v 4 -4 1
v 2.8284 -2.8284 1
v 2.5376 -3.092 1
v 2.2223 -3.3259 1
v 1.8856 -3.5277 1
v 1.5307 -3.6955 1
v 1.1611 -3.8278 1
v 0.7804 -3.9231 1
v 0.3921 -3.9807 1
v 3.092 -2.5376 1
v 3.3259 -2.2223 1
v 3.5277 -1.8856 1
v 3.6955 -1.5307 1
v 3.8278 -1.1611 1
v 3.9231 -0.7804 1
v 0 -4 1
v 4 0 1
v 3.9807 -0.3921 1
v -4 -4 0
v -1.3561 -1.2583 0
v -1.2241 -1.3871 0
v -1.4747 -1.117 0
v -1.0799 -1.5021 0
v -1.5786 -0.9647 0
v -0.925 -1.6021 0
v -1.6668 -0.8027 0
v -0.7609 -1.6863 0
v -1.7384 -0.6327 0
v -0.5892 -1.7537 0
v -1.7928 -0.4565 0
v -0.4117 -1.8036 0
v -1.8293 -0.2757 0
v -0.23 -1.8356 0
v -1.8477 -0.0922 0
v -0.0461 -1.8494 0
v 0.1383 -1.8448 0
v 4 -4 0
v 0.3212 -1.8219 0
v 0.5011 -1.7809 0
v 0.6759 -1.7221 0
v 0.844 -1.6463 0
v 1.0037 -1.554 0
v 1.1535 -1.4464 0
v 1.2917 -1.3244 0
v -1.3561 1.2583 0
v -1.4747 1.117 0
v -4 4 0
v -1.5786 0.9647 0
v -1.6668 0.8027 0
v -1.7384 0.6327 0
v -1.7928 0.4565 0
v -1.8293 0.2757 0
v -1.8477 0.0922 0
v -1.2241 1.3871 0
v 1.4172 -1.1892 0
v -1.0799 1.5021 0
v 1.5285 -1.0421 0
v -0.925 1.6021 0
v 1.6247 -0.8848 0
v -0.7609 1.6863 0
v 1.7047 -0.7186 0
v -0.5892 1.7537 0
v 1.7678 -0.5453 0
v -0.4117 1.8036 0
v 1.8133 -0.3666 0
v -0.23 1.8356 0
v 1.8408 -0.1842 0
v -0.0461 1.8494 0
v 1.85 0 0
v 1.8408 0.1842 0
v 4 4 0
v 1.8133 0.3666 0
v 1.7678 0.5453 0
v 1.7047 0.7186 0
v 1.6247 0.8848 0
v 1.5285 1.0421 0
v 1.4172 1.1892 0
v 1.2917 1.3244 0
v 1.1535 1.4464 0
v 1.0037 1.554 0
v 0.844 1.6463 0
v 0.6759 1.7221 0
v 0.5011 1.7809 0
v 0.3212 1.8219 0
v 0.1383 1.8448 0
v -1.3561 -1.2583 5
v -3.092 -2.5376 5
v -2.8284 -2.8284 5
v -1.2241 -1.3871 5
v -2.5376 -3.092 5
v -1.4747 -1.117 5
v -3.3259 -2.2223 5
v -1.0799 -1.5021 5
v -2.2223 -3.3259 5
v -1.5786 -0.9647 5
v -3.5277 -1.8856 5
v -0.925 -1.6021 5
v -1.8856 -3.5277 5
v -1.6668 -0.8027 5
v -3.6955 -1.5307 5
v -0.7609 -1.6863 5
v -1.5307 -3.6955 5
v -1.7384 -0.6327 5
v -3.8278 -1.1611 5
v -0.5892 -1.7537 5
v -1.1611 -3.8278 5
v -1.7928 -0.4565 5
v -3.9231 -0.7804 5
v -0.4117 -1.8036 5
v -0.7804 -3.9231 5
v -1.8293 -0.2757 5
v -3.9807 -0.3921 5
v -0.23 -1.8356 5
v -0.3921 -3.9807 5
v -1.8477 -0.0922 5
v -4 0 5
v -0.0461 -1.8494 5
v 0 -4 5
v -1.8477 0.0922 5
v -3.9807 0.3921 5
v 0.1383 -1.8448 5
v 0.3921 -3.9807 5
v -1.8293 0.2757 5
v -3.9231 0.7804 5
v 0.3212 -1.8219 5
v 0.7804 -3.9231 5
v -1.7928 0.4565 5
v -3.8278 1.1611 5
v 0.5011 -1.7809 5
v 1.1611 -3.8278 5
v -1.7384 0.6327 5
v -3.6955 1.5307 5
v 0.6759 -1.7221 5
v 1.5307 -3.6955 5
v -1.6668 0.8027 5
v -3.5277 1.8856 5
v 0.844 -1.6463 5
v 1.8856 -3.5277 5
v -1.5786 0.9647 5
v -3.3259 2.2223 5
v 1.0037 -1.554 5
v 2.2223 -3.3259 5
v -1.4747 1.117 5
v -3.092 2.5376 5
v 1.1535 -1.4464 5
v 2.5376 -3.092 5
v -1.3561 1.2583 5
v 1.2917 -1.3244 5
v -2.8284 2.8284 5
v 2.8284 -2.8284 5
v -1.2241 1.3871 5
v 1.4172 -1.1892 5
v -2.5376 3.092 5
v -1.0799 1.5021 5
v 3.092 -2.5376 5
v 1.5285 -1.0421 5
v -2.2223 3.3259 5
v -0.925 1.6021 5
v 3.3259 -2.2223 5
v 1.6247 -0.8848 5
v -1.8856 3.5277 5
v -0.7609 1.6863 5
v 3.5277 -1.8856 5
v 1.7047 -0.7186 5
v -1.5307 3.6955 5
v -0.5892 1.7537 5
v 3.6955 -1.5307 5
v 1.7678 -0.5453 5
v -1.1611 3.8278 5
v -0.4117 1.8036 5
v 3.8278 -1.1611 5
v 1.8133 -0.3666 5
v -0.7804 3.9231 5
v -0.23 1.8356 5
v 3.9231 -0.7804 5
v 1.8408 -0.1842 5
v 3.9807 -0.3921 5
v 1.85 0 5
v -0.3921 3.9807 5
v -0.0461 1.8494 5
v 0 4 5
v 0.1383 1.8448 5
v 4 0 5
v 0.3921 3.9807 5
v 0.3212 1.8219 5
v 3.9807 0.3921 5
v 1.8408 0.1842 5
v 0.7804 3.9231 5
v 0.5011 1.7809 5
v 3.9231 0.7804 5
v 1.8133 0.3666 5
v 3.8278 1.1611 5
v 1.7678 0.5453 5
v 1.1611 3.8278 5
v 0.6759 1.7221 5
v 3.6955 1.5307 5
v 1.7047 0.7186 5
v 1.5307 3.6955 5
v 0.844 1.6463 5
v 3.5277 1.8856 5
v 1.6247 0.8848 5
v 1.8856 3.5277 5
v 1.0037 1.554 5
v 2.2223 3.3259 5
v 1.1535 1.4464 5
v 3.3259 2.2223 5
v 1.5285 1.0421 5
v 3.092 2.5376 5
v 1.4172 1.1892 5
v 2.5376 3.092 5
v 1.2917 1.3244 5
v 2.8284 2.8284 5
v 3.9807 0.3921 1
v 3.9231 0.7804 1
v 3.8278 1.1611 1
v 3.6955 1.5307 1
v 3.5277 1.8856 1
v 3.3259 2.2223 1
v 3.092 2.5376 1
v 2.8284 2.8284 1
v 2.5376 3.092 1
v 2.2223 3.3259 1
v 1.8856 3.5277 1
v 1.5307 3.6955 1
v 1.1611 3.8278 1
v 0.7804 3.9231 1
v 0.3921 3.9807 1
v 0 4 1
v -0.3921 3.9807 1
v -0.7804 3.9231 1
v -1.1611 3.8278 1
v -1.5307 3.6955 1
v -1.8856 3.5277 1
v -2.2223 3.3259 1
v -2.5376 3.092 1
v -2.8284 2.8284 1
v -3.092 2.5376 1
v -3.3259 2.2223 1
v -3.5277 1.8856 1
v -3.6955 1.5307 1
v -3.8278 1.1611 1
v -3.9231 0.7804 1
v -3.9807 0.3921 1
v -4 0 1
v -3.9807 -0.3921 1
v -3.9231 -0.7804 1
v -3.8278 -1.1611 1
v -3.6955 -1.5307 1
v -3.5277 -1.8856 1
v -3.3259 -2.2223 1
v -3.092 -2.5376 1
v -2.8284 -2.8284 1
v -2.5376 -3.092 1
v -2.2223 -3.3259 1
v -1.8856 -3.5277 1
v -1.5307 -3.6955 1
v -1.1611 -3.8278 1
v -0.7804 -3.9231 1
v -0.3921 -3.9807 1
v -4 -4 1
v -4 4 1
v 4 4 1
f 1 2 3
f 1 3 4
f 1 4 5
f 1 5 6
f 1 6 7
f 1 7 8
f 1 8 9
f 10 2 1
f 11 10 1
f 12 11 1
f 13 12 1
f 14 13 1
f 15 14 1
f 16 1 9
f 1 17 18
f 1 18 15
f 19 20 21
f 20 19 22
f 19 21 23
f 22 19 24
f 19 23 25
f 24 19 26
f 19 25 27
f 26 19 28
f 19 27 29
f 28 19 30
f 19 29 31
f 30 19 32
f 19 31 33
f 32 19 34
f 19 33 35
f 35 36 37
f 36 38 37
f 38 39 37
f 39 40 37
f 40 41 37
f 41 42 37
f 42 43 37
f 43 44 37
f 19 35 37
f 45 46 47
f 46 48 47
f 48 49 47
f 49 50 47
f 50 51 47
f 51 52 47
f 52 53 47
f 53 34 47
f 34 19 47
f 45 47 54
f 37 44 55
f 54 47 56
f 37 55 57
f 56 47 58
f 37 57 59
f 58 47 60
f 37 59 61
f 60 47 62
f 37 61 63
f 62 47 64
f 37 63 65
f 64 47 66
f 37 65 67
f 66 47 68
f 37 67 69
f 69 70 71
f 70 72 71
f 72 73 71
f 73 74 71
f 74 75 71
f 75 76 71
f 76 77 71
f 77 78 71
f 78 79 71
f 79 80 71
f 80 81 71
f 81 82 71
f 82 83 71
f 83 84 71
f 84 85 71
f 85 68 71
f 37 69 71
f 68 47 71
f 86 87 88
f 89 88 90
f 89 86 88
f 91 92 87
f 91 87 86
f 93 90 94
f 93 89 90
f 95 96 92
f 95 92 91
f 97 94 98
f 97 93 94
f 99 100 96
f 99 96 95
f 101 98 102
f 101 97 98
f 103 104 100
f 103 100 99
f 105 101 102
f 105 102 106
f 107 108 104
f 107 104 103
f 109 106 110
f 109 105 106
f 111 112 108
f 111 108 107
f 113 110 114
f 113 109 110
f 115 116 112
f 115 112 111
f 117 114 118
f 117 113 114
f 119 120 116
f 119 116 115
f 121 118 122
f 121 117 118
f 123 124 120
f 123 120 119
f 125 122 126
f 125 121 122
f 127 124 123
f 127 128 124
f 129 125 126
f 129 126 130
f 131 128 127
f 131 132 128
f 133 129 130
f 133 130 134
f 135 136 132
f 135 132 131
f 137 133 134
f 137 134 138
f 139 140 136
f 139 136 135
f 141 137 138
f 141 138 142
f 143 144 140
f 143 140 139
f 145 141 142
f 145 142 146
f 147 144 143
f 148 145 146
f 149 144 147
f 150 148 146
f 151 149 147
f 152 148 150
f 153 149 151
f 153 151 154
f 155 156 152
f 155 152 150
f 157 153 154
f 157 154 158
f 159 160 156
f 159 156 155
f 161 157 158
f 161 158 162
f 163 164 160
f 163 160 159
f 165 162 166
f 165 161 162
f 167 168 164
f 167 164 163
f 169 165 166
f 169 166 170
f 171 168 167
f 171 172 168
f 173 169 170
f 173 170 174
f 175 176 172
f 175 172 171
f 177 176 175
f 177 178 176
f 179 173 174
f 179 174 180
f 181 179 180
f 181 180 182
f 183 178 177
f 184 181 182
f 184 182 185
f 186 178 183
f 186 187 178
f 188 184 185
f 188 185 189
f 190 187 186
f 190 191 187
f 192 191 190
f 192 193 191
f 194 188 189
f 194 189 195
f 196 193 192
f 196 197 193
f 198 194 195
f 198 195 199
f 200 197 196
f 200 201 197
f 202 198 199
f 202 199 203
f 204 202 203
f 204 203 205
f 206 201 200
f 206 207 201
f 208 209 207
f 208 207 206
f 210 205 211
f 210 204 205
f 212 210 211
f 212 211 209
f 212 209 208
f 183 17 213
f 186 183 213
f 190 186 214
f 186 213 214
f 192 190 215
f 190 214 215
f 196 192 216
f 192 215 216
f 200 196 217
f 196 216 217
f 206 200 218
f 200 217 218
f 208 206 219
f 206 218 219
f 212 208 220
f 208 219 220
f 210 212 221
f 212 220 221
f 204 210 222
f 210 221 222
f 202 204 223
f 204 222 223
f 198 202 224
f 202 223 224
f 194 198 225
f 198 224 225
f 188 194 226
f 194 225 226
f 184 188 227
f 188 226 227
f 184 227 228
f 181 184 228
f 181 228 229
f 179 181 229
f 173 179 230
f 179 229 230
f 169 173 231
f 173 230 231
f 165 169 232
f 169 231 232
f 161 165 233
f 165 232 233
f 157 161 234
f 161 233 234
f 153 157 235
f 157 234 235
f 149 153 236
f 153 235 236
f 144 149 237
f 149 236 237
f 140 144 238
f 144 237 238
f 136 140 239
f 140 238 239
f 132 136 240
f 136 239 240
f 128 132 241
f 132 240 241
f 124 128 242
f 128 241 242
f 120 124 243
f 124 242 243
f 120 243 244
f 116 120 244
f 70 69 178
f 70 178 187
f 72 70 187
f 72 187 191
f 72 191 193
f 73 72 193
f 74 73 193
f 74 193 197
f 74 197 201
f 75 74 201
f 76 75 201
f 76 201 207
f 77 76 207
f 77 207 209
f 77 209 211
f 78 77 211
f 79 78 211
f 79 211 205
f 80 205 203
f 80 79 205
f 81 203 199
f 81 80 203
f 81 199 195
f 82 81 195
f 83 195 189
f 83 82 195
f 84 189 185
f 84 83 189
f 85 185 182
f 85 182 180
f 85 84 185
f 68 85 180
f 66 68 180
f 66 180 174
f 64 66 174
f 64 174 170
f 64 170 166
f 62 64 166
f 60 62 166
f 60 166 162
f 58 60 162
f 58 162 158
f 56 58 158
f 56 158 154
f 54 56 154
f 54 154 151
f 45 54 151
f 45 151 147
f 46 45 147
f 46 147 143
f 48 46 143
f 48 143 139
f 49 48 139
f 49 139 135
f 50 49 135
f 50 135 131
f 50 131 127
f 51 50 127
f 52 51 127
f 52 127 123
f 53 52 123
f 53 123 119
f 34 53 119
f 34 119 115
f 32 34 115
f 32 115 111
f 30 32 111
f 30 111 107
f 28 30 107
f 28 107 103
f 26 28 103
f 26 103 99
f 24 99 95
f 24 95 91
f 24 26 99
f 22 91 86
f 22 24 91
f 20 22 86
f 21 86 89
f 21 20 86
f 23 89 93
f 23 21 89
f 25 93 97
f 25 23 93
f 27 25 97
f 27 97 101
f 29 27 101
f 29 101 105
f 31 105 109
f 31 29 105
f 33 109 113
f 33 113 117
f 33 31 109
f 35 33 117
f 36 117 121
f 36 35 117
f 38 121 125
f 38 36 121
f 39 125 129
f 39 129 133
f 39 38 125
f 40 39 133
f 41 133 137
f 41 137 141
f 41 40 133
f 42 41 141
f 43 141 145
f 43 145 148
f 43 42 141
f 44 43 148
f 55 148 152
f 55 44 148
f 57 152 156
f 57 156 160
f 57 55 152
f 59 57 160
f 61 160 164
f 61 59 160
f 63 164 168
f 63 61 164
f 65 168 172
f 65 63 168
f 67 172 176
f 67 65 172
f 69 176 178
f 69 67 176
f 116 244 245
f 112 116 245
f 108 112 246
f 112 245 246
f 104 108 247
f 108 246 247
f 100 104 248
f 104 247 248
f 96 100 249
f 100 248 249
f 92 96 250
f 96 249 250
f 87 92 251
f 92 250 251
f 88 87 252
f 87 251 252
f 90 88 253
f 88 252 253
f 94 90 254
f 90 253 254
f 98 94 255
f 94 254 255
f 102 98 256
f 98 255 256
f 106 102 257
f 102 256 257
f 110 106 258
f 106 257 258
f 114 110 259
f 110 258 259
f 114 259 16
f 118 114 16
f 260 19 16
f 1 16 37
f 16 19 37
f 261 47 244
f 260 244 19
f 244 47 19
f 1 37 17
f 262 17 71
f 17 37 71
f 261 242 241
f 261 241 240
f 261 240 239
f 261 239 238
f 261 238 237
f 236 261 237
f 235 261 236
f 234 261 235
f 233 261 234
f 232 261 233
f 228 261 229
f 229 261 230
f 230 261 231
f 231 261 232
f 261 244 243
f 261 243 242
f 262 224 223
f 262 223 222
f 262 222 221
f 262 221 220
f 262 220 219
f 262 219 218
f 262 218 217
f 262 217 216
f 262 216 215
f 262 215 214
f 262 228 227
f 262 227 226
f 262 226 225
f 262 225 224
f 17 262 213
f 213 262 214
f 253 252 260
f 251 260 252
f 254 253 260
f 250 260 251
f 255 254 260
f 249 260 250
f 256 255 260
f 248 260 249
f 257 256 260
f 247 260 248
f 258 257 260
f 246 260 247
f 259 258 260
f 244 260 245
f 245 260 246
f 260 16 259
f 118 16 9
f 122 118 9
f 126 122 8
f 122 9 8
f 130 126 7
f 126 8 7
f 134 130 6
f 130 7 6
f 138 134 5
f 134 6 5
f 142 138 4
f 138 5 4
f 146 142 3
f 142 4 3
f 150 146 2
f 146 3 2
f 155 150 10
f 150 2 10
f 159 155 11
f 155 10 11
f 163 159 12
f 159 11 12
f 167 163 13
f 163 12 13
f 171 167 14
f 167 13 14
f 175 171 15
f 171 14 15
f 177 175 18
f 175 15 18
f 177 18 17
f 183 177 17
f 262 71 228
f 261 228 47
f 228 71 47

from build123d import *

# Parameters (mm, degrees)
F0_R     = 1.85
F1_DEPTH = 1
F2_DEPTH = 5


with BuildPart() as f1:
    # F0 (on Top) → F1 (new body)
    with BuildSketch(Plane.XY):
        with BuildLine():
            ThreePointArc((4, 0), (2.8284271247, 2.8284271247), (0, 4))
            ThreePointArc((0, 4), (-2.8284271247, 2.8284271247), (-4, 0))
            ThreePointArc((-4, 0), (-2.8284271247, -2.8284271247), (0, -4))
            ThreePointArc((0, -4), (2.8284271247, -2.8284271247), (4, 0))
        make_face()
        Circle(F0_R, mode=Mode.SUBTRACT)
        with BuildLine():
            Line((0, 4), (-4, 4))
            Line((-4, 4), (-4, 0))
            ThreePointArc((-4, 0), (-2.8284271247, 2.8284271247), (0, 4))
        make_face()
        with BuildLine():
            Line((4, 4), (0, 4))
            ThreePointArc((0, 4), (2.8284271247, 2.8284271247), (4, 0))
            Line((4, 0), (4, 4))
        make_face()
        with BuildLine():
            ThreePointArc((0, -4), (-2.8284271247, -2.8284271247), (-4, 0))
            Line((-4, 0), (-4, -4))
            Line((-4, -4), (0, -4))
        make_face()
        with BuildLine():
            Line((4, -4), (4, 0))
            ThreePointArc((4, 0), (2.8284271247, -2.8284271247), (0, -4))
            Line((0, -4), (4, -4))
        make_face()
    extrude(amount=F1_DEPTH)

    # F0 (on Top) → F2 (join)
    with BuildSketch(Plane.XY):
        with BuildLine():
            ThreePointArc((4, 0), (2.8284271247, 2.8284271247), (0, 4))
            ThreePointArc((0, 4), (-2.8284271247, 2.8284271247), (-4, 0))
            ThreePointArc((-4, 0), (-2.8284271247, -2.8284271247), (0, -4))
            ThreePointArc((0, -4), (2.8284271247, -2.8284271247), (4, 0))
        make_face()
        Circle(F0_R, mode=Mode.SUBTRACT)
    extrude(amount=F2_DEPTH)


solid = f1.part
